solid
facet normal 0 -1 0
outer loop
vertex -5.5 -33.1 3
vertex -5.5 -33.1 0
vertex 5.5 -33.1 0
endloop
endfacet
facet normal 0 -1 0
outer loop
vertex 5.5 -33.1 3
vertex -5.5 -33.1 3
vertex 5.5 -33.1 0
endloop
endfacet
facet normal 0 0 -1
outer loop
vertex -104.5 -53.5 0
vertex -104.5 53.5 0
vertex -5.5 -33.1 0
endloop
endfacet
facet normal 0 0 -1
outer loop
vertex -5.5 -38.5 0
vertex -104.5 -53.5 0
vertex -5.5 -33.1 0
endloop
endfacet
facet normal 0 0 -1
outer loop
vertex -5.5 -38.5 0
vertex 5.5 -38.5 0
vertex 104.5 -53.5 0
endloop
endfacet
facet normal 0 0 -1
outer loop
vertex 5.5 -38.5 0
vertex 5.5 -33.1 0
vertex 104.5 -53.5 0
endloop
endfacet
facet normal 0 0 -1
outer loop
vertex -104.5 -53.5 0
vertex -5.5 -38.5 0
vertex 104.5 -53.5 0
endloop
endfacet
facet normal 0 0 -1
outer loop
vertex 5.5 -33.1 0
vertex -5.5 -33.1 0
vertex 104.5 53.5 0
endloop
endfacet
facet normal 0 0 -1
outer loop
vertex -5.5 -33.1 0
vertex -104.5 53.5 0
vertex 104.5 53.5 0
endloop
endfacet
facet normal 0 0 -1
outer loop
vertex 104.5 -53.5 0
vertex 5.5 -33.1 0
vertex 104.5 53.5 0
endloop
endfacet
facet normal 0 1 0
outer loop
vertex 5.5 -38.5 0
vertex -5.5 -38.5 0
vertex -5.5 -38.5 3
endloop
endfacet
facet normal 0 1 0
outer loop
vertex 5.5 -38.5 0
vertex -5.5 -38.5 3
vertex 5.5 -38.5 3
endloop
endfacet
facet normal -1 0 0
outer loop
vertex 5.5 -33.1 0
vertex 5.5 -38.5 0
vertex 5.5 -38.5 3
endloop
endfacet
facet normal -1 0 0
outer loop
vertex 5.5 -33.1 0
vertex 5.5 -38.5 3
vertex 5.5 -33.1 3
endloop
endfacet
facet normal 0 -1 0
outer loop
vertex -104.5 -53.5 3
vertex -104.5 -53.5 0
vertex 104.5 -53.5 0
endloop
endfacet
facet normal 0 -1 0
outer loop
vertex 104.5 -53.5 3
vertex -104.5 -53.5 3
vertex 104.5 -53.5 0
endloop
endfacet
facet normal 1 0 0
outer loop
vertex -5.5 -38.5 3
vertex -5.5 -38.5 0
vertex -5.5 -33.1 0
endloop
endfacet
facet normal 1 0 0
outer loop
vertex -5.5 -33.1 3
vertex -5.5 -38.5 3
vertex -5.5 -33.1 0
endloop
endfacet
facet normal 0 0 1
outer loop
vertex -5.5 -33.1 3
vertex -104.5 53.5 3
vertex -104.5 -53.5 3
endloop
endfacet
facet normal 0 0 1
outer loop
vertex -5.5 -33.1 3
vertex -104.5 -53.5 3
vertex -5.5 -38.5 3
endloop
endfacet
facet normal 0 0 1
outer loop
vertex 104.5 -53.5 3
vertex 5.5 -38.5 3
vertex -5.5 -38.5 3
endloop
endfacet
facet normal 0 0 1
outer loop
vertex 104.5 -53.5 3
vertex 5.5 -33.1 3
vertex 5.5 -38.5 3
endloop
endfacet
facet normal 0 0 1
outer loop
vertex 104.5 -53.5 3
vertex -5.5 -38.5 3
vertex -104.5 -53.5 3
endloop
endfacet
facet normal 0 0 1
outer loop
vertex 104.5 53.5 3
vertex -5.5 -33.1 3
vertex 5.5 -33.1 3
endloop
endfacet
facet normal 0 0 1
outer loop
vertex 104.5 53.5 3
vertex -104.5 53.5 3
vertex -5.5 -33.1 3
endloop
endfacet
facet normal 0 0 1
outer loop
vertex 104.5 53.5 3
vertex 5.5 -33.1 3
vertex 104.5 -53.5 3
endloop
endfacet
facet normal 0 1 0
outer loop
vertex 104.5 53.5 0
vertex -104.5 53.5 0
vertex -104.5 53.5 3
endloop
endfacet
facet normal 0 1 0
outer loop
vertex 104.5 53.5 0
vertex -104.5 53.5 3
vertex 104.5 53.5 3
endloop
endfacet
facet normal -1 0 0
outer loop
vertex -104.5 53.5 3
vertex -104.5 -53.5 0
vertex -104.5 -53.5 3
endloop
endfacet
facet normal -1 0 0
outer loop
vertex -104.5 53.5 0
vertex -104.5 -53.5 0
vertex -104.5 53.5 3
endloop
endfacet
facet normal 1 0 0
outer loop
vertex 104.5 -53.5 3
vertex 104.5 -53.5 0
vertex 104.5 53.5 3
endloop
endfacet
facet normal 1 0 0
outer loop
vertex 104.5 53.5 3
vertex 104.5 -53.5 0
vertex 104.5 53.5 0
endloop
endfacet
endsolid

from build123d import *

# Parameters (mm, degrees)
SKETCH1_W           = 209
SKETCH1_H           = 107
SKETCH1_W_2         = 11
SKETCH1_H_2         = 5.4
BOSS_EXTRUDE1_DEPTH = 3


with BuildPart() as part:
    # Sketch1 → Boss-Extrude1 (new body)
    with BuildSketch(Plane.XY):
        Rectangle(SKETCH1_W, SKETCH1_H)
        with Locations((0, -35.8)):
            Rectangle(SKETCH1_W_2, SKETCH1_H_2, mode=Mode.SUBTRACT)
    extrude(amount=BOSS_EXTRUDE1_DEPTH)


solid = part.part
